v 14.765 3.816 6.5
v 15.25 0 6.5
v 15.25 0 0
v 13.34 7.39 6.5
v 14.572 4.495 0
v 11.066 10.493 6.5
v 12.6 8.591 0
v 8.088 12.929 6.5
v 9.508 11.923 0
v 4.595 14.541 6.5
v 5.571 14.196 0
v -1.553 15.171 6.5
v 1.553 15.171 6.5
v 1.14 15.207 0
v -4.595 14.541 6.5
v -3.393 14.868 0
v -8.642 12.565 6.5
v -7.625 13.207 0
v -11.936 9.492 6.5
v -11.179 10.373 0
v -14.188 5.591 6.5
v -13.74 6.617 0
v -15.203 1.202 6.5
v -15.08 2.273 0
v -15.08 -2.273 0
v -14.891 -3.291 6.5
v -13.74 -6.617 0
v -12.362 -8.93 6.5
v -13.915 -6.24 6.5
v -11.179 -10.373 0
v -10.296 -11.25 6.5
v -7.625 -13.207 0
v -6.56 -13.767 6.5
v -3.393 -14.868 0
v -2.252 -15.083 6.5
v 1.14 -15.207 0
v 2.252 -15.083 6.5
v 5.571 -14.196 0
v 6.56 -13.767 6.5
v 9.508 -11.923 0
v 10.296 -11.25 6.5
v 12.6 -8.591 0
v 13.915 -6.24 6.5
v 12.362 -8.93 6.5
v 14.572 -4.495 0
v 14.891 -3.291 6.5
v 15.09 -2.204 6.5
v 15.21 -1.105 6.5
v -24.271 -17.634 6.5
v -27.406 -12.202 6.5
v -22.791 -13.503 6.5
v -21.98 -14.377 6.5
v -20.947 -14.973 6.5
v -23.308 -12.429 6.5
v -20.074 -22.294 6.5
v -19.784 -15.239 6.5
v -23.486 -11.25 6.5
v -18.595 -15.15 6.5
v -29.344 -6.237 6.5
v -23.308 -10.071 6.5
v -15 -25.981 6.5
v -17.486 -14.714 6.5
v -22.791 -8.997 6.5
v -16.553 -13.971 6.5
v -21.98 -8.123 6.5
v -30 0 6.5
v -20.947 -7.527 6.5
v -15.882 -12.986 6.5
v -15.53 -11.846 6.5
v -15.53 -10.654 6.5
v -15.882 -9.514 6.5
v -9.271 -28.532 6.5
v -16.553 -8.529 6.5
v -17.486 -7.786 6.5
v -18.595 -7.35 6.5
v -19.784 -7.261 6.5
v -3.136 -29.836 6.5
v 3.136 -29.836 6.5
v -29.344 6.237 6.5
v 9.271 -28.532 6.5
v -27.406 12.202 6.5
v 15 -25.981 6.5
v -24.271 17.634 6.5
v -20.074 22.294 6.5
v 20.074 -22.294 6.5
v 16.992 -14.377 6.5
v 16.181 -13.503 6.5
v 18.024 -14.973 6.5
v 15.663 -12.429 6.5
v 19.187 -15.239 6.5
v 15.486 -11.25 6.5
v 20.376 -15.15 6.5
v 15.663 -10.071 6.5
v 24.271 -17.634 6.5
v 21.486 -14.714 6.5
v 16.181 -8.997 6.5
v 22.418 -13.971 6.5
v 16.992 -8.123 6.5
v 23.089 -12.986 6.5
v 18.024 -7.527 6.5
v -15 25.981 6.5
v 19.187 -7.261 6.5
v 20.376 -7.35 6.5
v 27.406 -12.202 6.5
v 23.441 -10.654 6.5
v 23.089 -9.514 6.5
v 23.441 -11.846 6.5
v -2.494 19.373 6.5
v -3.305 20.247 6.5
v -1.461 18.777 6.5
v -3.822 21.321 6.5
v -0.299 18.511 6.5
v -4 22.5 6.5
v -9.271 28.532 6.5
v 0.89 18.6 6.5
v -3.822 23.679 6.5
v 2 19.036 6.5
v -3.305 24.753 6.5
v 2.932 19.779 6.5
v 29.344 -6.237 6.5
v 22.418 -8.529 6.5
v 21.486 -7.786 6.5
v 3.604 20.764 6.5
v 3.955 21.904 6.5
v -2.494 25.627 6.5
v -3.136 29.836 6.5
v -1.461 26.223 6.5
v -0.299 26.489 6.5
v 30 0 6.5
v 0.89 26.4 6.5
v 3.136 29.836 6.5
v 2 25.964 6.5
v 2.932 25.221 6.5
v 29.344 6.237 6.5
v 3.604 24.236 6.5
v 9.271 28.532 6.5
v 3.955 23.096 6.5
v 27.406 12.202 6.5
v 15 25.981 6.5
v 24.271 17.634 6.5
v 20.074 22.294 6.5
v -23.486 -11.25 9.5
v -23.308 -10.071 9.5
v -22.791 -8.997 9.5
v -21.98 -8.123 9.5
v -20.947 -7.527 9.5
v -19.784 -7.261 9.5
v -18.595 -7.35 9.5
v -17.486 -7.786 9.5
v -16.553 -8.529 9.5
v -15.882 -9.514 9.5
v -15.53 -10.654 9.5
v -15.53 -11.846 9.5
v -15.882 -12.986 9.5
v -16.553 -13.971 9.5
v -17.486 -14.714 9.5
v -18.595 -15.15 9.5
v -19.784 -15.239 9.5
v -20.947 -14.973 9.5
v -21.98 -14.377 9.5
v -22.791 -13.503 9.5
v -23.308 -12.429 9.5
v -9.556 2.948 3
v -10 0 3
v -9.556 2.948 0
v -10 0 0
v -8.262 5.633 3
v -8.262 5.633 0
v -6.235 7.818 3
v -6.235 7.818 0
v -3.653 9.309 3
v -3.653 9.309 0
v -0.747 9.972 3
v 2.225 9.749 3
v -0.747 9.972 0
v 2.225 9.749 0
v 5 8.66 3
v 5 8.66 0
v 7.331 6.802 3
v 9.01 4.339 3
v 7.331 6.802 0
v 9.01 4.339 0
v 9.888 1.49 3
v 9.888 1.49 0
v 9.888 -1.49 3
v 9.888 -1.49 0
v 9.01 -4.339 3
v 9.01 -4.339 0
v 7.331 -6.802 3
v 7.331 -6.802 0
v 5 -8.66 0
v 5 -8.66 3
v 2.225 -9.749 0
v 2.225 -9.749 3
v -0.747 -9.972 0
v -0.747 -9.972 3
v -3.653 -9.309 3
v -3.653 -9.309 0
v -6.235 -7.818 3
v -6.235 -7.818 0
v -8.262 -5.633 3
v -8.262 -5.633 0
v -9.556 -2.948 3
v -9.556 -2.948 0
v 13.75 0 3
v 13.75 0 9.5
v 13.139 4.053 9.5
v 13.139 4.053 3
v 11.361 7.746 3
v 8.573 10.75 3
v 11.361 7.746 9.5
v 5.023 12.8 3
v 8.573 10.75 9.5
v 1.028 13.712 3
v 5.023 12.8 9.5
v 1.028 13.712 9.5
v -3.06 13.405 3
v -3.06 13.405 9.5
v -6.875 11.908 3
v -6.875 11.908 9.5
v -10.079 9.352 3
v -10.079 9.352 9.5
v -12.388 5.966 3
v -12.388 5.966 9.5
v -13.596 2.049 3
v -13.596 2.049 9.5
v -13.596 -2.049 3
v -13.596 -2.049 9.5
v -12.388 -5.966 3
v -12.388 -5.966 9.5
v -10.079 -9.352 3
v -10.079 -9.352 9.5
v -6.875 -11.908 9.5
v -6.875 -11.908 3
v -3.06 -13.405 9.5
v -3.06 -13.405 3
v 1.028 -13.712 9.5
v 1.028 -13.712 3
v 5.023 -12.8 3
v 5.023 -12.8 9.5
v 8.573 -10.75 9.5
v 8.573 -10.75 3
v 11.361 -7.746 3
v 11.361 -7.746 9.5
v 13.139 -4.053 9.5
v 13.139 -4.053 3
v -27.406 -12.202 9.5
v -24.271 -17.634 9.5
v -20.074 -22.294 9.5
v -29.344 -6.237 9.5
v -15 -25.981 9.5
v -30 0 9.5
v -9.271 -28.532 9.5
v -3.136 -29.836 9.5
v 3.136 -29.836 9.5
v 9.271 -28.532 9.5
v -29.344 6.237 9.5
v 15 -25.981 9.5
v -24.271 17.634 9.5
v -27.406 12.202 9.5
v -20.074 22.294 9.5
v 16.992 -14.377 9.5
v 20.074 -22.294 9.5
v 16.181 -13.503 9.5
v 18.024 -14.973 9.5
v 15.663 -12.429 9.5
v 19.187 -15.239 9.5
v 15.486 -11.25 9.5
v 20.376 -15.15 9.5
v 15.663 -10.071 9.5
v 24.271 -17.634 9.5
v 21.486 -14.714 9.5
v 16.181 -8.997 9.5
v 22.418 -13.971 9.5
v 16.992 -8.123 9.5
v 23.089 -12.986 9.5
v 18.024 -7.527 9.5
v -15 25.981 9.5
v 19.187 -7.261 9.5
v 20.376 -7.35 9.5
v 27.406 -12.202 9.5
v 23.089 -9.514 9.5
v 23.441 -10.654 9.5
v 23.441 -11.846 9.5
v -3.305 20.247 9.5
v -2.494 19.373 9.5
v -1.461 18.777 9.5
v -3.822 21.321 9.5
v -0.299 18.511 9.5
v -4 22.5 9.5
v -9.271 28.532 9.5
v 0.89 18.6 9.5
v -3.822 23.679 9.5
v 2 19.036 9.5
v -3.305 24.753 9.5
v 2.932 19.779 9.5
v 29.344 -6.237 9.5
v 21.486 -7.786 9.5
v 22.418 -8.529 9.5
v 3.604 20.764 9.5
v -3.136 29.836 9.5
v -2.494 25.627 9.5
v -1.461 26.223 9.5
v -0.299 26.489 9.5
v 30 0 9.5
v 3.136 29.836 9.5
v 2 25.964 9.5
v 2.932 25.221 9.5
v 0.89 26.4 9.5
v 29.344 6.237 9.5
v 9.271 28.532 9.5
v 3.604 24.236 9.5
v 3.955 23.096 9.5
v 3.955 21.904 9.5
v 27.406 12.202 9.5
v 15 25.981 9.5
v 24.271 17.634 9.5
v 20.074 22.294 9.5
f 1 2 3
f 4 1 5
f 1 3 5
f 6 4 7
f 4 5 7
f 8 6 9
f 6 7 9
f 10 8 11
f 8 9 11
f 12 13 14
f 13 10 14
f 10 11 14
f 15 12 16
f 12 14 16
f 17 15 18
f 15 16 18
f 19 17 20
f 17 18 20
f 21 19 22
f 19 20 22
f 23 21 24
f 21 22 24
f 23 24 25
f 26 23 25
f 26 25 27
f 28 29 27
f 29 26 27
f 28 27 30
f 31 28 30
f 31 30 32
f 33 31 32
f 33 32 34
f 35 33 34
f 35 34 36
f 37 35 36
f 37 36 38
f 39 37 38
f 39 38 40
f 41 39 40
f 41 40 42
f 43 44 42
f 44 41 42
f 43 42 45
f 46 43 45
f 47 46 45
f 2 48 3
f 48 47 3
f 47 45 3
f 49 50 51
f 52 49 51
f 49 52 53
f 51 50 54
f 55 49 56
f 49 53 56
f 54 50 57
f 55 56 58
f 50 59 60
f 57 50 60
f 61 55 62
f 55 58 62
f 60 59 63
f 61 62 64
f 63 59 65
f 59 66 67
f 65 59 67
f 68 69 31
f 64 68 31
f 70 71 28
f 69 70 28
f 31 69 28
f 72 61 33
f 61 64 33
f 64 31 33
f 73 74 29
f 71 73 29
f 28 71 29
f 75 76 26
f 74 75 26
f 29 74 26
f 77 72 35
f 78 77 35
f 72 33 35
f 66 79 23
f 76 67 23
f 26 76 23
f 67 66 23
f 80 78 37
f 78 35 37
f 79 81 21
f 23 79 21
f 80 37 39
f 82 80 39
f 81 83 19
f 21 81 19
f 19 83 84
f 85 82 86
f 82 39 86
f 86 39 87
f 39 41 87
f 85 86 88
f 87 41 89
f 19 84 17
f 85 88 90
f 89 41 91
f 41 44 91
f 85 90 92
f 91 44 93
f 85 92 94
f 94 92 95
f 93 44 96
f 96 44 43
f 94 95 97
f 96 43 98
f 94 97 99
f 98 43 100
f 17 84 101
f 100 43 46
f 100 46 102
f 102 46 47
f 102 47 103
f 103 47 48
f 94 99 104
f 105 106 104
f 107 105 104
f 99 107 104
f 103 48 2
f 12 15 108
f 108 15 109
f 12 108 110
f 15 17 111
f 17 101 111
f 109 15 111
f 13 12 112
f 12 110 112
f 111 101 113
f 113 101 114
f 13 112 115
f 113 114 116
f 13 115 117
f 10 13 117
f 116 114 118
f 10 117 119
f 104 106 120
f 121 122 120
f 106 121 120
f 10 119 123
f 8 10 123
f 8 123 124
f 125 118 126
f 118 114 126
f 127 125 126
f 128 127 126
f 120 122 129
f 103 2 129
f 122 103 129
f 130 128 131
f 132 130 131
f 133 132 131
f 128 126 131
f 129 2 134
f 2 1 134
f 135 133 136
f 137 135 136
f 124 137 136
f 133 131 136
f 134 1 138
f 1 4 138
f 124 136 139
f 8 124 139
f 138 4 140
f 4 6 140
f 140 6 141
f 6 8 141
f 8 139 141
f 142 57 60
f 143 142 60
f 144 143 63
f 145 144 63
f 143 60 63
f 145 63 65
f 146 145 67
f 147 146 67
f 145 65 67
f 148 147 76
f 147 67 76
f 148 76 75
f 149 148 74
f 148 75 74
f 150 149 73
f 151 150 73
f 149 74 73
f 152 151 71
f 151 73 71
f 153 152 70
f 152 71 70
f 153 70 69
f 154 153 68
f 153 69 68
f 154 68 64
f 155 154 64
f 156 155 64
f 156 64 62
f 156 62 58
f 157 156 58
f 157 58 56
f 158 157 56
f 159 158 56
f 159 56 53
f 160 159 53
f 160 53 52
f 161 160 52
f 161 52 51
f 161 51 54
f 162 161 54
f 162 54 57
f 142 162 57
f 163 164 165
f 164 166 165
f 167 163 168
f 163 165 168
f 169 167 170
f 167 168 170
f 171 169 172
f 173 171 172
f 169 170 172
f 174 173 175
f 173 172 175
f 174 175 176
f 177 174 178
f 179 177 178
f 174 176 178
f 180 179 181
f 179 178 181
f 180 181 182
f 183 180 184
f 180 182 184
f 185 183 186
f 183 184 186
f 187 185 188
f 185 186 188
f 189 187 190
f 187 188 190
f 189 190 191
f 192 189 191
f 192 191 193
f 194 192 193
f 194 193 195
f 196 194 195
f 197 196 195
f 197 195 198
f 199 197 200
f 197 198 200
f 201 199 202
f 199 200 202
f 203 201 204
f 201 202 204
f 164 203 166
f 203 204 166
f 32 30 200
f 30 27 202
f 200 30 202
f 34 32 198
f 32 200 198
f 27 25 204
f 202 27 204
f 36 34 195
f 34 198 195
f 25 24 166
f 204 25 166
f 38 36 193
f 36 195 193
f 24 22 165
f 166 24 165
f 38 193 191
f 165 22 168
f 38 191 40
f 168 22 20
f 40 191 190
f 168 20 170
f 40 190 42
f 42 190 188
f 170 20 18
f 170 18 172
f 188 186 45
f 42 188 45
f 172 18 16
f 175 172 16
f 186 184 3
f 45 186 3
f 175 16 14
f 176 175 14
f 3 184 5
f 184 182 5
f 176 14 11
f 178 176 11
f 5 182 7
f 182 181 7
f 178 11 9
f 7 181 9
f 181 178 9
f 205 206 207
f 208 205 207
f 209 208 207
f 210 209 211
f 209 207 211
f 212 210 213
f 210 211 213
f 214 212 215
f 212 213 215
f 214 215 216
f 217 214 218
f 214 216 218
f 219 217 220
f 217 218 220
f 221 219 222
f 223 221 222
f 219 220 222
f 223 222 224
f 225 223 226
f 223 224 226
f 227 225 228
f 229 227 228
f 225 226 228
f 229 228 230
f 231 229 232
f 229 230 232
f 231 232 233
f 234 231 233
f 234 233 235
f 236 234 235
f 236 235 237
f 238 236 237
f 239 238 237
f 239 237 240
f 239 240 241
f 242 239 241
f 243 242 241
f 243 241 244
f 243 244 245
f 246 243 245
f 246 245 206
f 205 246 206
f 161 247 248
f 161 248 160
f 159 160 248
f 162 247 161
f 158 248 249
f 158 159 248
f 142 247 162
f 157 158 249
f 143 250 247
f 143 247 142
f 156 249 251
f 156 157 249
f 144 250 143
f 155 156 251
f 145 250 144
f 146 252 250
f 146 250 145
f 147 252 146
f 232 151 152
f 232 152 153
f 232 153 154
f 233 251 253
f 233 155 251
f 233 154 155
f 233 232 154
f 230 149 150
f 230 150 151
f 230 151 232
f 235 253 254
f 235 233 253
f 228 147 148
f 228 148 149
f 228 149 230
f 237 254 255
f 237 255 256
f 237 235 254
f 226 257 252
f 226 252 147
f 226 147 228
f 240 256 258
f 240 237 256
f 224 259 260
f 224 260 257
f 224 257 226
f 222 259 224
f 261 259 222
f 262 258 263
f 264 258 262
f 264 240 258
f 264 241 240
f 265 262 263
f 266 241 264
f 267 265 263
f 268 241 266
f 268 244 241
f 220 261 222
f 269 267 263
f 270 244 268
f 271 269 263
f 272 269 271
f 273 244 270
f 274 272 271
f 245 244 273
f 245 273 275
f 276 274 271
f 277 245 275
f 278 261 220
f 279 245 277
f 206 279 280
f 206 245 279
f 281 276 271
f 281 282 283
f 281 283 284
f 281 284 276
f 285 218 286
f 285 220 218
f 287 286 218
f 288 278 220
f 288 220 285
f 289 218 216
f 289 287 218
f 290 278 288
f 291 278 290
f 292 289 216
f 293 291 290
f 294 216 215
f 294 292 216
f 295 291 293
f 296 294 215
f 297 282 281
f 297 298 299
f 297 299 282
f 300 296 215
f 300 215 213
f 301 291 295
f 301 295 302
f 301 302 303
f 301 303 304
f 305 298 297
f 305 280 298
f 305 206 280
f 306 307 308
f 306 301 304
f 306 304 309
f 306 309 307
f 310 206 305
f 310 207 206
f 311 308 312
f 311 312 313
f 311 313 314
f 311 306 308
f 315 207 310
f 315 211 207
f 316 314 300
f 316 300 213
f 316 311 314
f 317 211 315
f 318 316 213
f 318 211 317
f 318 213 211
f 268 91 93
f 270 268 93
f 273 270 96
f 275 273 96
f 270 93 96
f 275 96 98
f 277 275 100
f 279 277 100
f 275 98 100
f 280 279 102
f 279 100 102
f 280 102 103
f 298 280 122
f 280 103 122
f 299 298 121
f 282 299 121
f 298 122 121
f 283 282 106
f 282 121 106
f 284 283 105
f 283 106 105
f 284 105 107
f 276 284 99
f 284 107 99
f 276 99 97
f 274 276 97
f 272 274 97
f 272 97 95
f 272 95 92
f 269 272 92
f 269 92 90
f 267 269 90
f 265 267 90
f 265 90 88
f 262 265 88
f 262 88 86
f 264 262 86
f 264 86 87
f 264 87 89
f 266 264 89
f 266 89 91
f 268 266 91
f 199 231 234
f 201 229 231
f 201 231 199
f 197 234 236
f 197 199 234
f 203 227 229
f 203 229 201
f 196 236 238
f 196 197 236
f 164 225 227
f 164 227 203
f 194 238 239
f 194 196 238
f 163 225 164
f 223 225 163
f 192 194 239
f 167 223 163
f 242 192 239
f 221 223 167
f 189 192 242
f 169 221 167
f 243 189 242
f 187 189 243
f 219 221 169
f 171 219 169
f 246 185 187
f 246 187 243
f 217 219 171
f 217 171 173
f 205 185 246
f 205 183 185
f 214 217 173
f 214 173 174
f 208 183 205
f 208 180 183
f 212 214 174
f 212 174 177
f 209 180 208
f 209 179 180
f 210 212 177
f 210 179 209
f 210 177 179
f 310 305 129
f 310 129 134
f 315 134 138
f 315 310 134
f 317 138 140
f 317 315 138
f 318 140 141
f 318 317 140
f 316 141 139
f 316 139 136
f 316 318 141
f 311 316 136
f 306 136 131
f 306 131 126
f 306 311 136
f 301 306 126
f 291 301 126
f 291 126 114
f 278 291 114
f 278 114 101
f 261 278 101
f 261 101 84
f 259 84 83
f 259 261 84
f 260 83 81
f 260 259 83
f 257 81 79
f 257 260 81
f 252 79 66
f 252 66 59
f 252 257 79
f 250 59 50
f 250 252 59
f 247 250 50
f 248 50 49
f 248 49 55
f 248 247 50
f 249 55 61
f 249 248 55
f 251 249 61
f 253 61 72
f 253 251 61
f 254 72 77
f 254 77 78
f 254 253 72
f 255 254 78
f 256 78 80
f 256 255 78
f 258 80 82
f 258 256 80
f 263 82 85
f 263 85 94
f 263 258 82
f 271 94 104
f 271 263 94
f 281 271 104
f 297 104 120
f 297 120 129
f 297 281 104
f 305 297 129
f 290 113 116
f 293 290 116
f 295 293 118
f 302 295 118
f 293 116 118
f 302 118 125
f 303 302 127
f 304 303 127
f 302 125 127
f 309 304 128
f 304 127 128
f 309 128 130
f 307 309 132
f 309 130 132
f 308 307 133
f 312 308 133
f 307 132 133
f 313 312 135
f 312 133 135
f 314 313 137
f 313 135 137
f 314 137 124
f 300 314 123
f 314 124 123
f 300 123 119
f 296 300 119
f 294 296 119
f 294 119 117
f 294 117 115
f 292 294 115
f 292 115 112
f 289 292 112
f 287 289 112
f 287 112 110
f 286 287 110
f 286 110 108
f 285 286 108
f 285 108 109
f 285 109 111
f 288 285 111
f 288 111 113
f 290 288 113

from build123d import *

# Parameters (mm, degrees)
F0_R           = 15.25
F1_DEPTH       = 9.5
F2_R           = 30
F3_DEPTH       = 3
F4_DEPTH       = 3
F5_DEPTH       = 3
F6_D           = 8
F6_DEPTH       = 5
F6_TIP         = 2.4034424761
F7_D           = 8
F7_DEPTH       = 5
F7_TIP         = 2.4034424761
F8_D           = 8
F8_DEPTH       = 5
F8_TIP         = 2.4034424761
F9_D           = 20
F9_DEPTH       = 50
F9_CBORE_D     = 27.5
F9_CBORE_DEPTH = 6.5
F9_TIP         = 6.0086061903


with BuildPart() as f1:
    # F0 (on Top) → F1 (new body)
    with BuildSketch(Plane.XY):
        Circle(F0_R)
    extrude(amount=F1_DEPTH)



with BuildPart() as f3:
    # F2 (on face) → F3 (new body)
    with BuildSketch(Plane.XY.offset(9.5)):
        Circle(F2_R)
        with BuildLine():
            ThreePointArc((0, 22.5), (15.9099025767, 15.9099025767), (22.5, 0))
            ThreePointArc((22.5, 0), (21.7333310915, -5.8234285148), (19.4855715851, -11.25))
            ThreePointArc((19.4855715851, -11.25), (0, -22.5), (-19.4855715851, -11.25))
            ThreePointArc((-19.4855715851, -11.25), (-19.4855715851, 11.25), (0, 22.5))
        make_face(mode=Mode.SUBTRACT)
    extrude(amount=-F3_DEPTH)


with BuildPart() as f1_1:
    add(f1.part)

    add(f3.part)  # F3#2 merges F3
    # F2 (on face) → F3, piece 2 (join)
    with BuildSketch(Plane.XY.offset(9.5)):
        with BuildLine():
            Line((-14.8906008631, -3.2912772501), (-19.4855715851, -11.25))
            Line((-19.4855715851, -11.25), (-10.295630141, -11.25))
            ThreePointArc((-10.295630141, -11.25), (-13.2068874077, -7.625), (-14.8906008631, -3.2912772501))
        make_face()
    extrude(amount=-F3_DEPTH)

    # F2 (on face) → F4 (join)
    with BuildSketch(Plane.XY.offset(9.5)):
        with BuildLine():
            Line((-4.5949707221, 14.5412772501), (0, 22.5))
            ThreePointArc((0, 22.5), (-19.4855715851, 11.25), (-19.4855715851, -11.25))
            Line((-19.4855715851, -11.25), (-14.8906008631, -3.2912772501))
            ThreePointArc((-14.8906008631, -3.2912772501), (-13.2068874077, 7.625), (-4.5949707221, 14.5412772501))
        make_face()
        with BuildLine():
            ThreePointArc((-19.4855715851, -11.25), (0, -22.5), (19.4855715851, -11.25))
            Line((19.4855715851, -11.25), (10.295630141, -11.25))
            ThreePointArc((10.295630141, -11.25), (0, -15.25), (-10.295630141, -11.25))
            Line((-10.295630141, -11.25), (-19.4855715851, -11.25))
        make_face()
        with BuildLine():
            ThreePointArc((19.4855715851, -11.25), (21.7333310915, -5.8234285148), (22.5, 0))
            ThreePointArc((22.5, 0), (15.9099025767, 15.9099025767), (0, 22.5))
            Line((0, 22.5), (4.5949707221, 14.5412772501))
            ThreePointArc((4.5949707221, 14.5412772501), (12.3011341654, 9.0135785482), (15.25, 0))
            ThreePointArc((15.25, 0), (15.1598839567, -1.655420919), (14.8906008631, -3.2912772501))
            Line((14.8906008631, -3.2912772501), (19.4855715851, -11.25))
        make_face()
    extrude(amount=-F4_DEPTH)

    # F2 (on face) → F5 (join)
    with BuildSketch(Plane.XY.offset(9.5)):
        with BuildLine():
            Line((4.5949707221, 14.5412772501), (0, 22.5))
            Line((0, 22.5), (-4.5949707221, 14.5412772501))
            ThreePointArc((-4.5949707221, 14.5412772501), (0, 15.25), (4.5949707221, 14.5412772501))
        make_face()
        with BuildLine():
            ThreePointArc((-19.4855715851, -11.25), (0, -22.5), (19.4855715851, -11.25))
            Line((19.4855715851, -11.25), (10.295630141, -11.25))
            ThreePointArc((10.295630141, -11.25), (0, -15.25), (-10.295630141, -11.25))
            Line((-10.295630141, -11.25), (-19.4855715851, -11.25))
        make_face()
        with BuildLine():
            Line((10.295630141, -11.25), (19.4855715851, -11.25))
            Line((19.4855715851, -11.25), (14.8906008631, -3.2912772501))
            ThreePointArc((14.8906008631, -3.2912772501), (13.2068874077, -7.625), (10.295630141, -11.25))
        make_face()
    extrude(amount=-F5_DEPTH)

    # F6
    with Locations(Plane.XY.offset(9.5)):
        with Locations((-19.4855715851, -11.25)):
            Hole(F6_D / 2, depth=F6_DEPTH)
            with Locations((0, 0, -(F6_DEPTH + F6_TIP / 2))):  # 118° drill point
                Cone(0, F6_D / 2, F6_TIP, mode=Mode.SUBTRACT)

    # F7
    with Locations(Plane.XY.offset(9.5)):
        with Locations((0, 22.5)):
            Hole(F7_D / 2, depth=F7_DEPTH)
            with Locations((0, 0, -(F7_DEPTH + F7_TIP / 2))):  # 118° drill point
                Cone(0, F7_D / 2, F7_TIP, mode=Mode.SUBTRACT)

    # F8
    with Locations(Plane.XY.offset(9.5)):
        with Locations((19.4855715851, -11.25)):
            Hole(F8_D / 2, depth=F8_DEPTH)
            with Locations((0, 0, -(F8_DEPTH + F8_TIP / 2))):  # 118° drill point
                Cone(0, F8_D / 2, F8_TIP, mode=Mode.SUBTRACT)

    # F9
    with Locations(Plane.XY.offset(9.5)):
        with Locations((0, 0)):
            CounterBoreHole(F9_D / 2, F9_CBORE_D / 2, F9_CBORE_DEPTH, depth=F9_DEPTH)
            with Locations((0, 0, -(F9_DEPTH + F9_TIP / 2))):  # 118° drill point
                Cone(0, F9_D / 2, F9_TIP, mode=Mode.SUBTRACT)


solid = f1_1.part
